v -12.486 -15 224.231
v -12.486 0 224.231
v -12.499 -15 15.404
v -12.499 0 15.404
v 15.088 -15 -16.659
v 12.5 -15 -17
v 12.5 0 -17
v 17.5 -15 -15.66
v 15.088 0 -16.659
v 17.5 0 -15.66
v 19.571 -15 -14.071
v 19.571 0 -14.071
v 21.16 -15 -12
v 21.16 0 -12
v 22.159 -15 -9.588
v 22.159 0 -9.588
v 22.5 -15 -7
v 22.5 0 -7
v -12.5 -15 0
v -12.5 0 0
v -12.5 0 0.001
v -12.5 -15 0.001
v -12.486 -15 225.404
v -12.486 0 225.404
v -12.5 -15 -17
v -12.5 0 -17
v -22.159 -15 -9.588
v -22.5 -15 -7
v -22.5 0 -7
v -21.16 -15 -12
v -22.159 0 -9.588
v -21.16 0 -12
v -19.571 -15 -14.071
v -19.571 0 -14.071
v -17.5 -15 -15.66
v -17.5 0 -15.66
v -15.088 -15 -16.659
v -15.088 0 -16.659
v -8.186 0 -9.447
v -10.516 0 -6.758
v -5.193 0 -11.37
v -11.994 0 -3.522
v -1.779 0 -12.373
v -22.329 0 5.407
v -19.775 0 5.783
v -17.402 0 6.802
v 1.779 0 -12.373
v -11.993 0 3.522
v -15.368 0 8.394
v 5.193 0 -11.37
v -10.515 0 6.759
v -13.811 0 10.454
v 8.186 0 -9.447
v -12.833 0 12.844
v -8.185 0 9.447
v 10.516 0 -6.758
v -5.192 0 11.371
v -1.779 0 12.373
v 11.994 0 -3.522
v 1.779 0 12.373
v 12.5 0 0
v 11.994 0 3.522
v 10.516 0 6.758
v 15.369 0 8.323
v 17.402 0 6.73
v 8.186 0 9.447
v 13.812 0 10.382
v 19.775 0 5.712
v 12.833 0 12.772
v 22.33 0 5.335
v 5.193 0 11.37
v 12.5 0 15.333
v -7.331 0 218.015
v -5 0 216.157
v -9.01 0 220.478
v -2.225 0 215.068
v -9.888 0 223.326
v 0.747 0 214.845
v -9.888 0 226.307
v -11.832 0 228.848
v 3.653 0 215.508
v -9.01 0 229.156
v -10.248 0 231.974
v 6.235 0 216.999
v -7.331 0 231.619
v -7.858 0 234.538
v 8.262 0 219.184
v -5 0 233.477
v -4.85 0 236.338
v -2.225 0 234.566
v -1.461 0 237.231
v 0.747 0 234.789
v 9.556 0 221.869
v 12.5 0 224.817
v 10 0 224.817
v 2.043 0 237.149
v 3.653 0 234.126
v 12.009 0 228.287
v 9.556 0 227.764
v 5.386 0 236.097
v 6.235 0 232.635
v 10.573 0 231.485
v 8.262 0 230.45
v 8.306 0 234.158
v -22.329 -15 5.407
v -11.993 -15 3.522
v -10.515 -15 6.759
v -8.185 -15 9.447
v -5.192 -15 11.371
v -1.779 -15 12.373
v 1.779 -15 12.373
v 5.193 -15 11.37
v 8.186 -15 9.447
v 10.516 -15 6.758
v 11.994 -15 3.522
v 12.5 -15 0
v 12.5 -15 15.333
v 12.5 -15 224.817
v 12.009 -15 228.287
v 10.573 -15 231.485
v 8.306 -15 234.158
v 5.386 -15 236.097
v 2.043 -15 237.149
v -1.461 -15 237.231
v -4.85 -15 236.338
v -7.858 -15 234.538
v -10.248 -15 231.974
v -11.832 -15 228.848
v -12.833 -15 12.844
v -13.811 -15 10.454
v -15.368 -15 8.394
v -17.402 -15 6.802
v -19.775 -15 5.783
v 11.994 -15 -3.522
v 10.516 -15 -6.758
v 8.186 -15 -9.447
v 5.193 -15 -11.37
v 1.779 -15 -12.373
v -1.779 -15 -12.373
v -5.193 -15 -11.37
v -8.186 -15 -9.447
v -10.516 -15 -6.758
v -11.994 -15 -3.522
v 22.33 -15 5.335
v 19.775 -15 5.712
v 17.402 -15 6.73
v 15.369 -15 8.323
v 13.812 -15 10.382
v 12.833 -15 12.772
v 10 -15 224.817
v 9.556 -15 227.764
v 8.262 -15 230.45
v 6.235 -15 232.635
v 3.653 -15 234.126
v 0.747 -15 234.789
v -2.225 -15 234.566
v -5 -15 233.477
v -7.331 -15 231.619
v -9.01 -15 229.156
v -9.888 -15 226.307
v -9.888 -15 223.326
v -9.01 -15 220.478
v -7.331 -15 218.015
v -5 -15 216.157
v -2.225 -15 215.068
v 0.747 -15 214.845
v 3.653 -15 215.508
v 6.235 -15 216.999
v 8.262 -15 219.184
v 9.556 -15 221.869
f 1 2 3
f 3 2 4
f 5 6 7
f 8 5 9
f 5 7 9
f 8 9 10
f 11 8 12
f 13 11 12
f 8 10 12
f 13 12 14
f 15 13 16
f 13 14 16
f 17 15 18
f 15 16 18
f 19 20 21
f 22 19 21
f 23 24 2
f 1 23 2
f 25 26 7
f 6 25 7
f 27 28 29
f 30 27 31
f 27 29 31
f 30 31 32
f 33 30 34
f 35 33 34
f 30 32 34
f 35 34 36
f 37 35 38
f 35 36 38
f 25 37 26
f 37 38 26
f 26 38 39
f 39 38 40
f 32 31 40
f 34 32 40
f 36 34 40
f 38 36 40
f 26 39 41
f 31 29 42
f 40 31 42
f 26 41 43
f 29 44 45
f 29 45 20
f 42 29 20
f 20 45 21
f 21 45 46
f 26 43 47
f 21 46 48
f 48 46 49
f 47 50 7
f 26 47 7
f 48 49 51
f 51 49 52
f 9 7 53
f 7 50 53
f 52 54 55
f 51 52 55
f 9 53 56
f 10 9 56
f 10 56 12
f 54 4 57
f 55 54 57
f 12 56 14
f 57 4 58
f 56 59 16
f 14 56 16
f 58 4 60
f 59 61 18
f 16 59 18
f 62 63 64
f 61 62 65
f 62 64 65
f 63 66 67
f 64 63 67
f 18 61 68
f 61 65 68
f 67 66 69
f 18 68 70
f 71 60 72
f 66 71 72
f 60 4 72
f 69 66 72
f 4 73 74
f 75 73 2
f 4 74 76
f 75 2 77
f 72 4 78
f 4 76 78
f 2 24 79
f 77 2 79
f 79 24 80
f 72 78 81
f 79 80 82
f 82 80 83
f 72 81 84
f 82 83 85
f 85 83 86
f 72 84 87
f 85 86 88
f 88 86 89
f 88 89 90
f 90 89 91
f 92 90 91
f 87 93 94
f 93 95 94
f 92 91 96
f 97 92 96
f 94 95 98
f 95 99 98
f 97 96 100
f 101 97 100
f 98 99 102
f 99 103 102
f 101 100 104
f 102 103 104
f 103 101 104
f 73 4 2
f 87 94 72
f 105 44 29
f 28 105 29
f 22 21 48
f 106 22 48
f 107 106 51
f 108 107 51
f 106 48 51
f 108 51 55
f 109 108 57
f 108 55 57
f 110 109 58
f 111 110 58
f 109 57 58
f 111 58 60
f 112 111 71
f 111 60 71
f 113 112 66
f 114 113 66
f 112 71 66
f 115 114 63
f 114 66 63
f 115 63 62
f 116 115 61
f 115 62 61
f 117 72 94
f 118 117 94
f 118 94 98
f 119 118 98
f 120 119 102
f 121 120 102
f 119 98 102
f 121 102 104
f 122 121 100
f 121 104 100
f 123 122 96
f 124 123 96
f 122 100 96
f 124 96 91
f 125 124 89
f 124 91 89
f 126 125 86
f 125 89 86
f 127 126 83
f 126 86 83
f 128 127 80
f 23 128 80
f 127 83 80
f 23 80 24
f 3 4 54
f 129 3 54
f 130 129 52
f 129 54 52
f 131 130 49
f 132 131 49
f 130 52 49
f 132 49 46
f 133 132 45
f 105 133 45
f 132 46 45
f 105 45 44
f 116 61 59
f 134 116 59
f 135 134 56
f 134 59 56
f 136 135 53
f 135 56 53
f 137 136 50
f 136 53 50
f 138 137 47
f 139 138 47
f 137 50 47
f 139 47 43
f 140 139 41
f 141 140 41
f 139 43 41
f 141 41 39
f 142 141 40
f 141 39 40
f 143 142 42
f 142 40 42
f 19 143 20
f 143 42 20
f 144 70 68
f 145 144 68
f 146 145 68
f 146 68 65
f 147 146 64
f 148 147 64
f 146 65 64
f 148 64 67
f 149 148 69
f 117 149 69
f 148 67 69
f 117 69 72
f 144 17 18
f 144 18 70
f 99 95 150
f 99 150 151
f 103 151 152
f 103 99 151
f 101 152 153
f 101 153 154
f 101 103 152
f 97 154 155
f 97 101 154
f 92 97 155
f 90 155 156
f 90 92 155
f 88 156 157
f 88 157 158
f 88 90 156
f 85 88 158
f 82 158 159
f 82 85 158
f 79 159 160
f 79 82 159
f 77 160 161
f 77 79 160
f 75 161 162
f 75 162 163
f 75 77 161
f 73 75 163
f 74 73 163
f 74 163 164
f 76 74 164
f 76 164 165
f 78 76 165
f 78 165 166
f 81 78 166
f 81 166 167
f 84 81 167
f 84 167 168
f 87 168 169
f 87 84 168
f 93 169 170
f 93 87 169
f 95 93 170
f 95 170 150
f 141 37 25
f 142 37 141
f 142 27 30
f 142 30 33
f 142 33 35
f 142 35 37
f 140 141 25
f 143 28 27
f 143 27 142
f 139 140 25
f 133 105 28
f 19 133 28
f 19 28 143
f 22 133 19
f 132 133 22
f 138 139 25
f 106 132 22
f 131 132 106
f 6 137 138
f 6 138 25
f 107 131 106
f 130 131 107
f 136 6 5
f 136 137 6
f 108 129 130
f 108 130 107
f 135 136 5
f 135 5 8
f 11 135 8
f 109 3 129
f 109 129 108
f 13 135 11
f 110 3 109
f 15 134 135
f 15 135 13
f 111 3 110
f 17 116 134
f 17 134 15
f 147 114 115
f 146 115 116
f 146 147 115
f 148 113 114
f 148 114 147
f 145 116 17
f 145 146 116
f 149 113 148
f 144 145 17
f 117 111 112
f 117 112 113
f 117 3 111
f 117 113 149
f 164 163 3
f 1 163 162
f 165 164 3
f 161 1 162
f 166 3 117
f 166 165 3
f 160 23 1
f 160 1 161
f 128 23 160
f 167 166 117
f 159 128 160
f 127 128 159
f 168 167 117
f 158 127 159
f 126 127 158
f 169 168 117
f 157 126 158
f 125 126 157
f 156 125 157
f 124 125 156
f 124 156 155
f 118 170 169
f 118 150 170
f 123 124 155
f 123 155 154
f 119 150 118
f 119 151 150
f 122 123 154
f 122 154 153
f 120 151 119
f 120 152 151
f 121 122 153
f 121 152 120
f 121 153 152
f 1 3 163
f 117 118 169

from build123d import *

# Parameters (mm, degrees)
F0_R     = 10
F1_DEPTH = 15


# Not quite as in the source:
# - a feature names something its author has since deleted; it is built from what else it names


with BuildPart() as f1:
    # F0 (on Front) → F1 (new body)
    with BuildSketch(Plane.XZ):
        with BuildLine():
            ThreePointArc((-12.4862537895, 224.2308067578), (0.2931105859, 212.3203037661), (12.5, 224.8168667409))
            ThreePointArc((12.5, 224.8168667409), (0.293876674, 237.3134117235), (-12.4861818401, 225.404457633))
            Line((-12.4861818401, 225.404457633), (-12.4862537895, 224.2308067578))
        make_face()
        with Locations((0, 224.8168667409)):
            Circle(F0_R, mode=Mode.SUBTRACT)
        with BuildLine():
            Line((12.5, 15.3332800892), (12.5, 224.8168667409))
            ThreePointArc((12.5, 224.8168667409), (0.2931105859, 212.3203037661), (-12.4862537895, 224.2308067578))
            Line((-12.4862537895, 224.2308067578), (-12.4990556694, 15.4044580276))
            ThreePointArc((-12.4990556694, 15.4044580276), (-15.36849483, 8.3940010786), (-22.3294631759, 5.4065092509))
            Line((-22.3294631759, 5.4065092509), (-22.5, -7))
            ThreePointArc((-22.5, -7), (-19.5710678119, -14.0710678119), (-12.5, -17))
            Line((-12.5, -17), (12.5, -17))
            ThreePointArc((12.5, -17), (19.5710678119, -14.0710678119), (22.5, -7))
            Line((22.5, -7), (22.3300547766, 5.3347242624))
            ThreePointArc((22.3300547766, 5.3347242624), (15.3691006095, 8.3225544574), (12.5, 15.3332800892))
        make_face()
        with BuildLine():
            ThreePointArc((-12.4999999765, 0.0007662994), (0.0003831497, 12.4999999941), (12.5, 0))
            ThreePointArc((12.5, 0), (0, -12.5), (-12.5, 0))
            Line((-12.5000000235, 0), (-12.4999999765, 0.0007662994))
        make_face(mode=Mode.SUBTRACT)
    extrude(amount=F1_DEPTH)


solid = f1.part
